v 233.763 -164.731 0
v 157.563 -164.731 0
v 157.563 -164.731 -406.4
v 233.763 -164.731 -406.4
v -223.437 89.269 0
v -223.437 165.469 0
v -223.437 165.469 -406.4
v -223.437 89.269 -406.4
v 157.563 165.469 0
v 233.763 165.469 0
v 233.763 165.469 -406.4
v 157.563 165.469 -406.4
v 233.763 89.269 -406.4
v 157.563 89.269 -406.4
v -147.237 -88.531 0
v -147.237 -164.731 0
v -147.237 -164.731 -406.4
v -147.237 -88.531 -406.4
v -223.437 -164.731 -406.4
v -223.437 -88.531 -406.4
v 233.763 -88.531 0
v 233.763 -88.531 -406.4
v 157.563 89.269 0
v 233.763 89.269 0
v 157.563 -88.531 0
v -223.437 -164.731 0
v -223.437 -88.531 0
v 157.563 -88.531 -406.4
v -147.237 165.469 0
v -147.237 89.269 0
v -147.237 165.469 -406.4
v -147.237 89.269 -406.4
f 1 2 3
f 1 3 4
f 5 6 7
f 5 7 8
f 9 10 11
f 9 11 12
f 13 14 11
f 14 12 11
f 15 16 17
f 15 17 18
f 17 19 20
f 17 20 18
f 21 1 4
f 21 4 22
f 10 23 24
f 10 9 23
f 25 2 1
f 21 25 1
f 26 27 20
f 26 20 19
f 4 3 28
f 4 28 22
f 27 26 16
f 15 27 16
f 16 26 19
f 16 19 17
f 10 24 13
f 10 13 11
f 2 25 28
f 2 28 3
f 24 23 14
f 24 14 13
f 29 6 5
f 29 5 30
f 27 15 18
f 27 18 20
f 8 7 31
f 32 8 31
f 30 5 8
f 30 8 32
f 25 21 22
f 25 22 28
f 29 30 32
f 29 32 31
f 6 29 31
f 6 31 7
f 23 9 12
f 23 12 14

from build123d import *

# Parameters (mm, degrees)
F0_W     = 38.1
F0_H     = 38.1
F1_DEPTH = 406.4


with BuildPart() as f1:
    # F0 (on Top) → F1 (new body)
    with BuildSketch(Plane.XY):
        Polygon((-185.33669, -126.630816), (-185.33669, -88.530816), (-223.43669, -88.530816), (-223.43669, -164.730816), (-147.23669, -164.730816), (-147.23669, -126.630816), align=None)
        with Locations((-166.28669, -107.580816)):
            Rectangle(F0_W, F0_H)
        with Locations((176.61331, -107.580816)):
            Rectangle(F0_W, F0_H)
        Polygon((233.76331, -88.530816), (195.66331, -88.530816), (195.66331, -126.630816), (157.56331, -126.630816), (157.56331, -164.730816), (233.76331, -164.730816), align=None)
        with Locations((176.61331, 108.319184)):
            Rectangle(F0_W, F0_H)
        Polygon((157.56331, 165.469184), (157.56331, 127.369184), (195.66331, 127.369184), (195.66331, 89.269184), (233.76331, 89.269184), (233.76331, 165.469184), align=None)
        with Locations((-166.28669, 108.319184)):
            Rectangle(F0_W, F0_H)
        Polygon((-185.33669, 89.269184), (-185.33669, 127.369184), (-147.23669, 127.369184), (-147.23669, 165.469184), (-223.43669, 165.469184), (-223.43669, 89.269184), align=None)
    extrude(amount=-F1_DEPTH)


solid = f1.part
